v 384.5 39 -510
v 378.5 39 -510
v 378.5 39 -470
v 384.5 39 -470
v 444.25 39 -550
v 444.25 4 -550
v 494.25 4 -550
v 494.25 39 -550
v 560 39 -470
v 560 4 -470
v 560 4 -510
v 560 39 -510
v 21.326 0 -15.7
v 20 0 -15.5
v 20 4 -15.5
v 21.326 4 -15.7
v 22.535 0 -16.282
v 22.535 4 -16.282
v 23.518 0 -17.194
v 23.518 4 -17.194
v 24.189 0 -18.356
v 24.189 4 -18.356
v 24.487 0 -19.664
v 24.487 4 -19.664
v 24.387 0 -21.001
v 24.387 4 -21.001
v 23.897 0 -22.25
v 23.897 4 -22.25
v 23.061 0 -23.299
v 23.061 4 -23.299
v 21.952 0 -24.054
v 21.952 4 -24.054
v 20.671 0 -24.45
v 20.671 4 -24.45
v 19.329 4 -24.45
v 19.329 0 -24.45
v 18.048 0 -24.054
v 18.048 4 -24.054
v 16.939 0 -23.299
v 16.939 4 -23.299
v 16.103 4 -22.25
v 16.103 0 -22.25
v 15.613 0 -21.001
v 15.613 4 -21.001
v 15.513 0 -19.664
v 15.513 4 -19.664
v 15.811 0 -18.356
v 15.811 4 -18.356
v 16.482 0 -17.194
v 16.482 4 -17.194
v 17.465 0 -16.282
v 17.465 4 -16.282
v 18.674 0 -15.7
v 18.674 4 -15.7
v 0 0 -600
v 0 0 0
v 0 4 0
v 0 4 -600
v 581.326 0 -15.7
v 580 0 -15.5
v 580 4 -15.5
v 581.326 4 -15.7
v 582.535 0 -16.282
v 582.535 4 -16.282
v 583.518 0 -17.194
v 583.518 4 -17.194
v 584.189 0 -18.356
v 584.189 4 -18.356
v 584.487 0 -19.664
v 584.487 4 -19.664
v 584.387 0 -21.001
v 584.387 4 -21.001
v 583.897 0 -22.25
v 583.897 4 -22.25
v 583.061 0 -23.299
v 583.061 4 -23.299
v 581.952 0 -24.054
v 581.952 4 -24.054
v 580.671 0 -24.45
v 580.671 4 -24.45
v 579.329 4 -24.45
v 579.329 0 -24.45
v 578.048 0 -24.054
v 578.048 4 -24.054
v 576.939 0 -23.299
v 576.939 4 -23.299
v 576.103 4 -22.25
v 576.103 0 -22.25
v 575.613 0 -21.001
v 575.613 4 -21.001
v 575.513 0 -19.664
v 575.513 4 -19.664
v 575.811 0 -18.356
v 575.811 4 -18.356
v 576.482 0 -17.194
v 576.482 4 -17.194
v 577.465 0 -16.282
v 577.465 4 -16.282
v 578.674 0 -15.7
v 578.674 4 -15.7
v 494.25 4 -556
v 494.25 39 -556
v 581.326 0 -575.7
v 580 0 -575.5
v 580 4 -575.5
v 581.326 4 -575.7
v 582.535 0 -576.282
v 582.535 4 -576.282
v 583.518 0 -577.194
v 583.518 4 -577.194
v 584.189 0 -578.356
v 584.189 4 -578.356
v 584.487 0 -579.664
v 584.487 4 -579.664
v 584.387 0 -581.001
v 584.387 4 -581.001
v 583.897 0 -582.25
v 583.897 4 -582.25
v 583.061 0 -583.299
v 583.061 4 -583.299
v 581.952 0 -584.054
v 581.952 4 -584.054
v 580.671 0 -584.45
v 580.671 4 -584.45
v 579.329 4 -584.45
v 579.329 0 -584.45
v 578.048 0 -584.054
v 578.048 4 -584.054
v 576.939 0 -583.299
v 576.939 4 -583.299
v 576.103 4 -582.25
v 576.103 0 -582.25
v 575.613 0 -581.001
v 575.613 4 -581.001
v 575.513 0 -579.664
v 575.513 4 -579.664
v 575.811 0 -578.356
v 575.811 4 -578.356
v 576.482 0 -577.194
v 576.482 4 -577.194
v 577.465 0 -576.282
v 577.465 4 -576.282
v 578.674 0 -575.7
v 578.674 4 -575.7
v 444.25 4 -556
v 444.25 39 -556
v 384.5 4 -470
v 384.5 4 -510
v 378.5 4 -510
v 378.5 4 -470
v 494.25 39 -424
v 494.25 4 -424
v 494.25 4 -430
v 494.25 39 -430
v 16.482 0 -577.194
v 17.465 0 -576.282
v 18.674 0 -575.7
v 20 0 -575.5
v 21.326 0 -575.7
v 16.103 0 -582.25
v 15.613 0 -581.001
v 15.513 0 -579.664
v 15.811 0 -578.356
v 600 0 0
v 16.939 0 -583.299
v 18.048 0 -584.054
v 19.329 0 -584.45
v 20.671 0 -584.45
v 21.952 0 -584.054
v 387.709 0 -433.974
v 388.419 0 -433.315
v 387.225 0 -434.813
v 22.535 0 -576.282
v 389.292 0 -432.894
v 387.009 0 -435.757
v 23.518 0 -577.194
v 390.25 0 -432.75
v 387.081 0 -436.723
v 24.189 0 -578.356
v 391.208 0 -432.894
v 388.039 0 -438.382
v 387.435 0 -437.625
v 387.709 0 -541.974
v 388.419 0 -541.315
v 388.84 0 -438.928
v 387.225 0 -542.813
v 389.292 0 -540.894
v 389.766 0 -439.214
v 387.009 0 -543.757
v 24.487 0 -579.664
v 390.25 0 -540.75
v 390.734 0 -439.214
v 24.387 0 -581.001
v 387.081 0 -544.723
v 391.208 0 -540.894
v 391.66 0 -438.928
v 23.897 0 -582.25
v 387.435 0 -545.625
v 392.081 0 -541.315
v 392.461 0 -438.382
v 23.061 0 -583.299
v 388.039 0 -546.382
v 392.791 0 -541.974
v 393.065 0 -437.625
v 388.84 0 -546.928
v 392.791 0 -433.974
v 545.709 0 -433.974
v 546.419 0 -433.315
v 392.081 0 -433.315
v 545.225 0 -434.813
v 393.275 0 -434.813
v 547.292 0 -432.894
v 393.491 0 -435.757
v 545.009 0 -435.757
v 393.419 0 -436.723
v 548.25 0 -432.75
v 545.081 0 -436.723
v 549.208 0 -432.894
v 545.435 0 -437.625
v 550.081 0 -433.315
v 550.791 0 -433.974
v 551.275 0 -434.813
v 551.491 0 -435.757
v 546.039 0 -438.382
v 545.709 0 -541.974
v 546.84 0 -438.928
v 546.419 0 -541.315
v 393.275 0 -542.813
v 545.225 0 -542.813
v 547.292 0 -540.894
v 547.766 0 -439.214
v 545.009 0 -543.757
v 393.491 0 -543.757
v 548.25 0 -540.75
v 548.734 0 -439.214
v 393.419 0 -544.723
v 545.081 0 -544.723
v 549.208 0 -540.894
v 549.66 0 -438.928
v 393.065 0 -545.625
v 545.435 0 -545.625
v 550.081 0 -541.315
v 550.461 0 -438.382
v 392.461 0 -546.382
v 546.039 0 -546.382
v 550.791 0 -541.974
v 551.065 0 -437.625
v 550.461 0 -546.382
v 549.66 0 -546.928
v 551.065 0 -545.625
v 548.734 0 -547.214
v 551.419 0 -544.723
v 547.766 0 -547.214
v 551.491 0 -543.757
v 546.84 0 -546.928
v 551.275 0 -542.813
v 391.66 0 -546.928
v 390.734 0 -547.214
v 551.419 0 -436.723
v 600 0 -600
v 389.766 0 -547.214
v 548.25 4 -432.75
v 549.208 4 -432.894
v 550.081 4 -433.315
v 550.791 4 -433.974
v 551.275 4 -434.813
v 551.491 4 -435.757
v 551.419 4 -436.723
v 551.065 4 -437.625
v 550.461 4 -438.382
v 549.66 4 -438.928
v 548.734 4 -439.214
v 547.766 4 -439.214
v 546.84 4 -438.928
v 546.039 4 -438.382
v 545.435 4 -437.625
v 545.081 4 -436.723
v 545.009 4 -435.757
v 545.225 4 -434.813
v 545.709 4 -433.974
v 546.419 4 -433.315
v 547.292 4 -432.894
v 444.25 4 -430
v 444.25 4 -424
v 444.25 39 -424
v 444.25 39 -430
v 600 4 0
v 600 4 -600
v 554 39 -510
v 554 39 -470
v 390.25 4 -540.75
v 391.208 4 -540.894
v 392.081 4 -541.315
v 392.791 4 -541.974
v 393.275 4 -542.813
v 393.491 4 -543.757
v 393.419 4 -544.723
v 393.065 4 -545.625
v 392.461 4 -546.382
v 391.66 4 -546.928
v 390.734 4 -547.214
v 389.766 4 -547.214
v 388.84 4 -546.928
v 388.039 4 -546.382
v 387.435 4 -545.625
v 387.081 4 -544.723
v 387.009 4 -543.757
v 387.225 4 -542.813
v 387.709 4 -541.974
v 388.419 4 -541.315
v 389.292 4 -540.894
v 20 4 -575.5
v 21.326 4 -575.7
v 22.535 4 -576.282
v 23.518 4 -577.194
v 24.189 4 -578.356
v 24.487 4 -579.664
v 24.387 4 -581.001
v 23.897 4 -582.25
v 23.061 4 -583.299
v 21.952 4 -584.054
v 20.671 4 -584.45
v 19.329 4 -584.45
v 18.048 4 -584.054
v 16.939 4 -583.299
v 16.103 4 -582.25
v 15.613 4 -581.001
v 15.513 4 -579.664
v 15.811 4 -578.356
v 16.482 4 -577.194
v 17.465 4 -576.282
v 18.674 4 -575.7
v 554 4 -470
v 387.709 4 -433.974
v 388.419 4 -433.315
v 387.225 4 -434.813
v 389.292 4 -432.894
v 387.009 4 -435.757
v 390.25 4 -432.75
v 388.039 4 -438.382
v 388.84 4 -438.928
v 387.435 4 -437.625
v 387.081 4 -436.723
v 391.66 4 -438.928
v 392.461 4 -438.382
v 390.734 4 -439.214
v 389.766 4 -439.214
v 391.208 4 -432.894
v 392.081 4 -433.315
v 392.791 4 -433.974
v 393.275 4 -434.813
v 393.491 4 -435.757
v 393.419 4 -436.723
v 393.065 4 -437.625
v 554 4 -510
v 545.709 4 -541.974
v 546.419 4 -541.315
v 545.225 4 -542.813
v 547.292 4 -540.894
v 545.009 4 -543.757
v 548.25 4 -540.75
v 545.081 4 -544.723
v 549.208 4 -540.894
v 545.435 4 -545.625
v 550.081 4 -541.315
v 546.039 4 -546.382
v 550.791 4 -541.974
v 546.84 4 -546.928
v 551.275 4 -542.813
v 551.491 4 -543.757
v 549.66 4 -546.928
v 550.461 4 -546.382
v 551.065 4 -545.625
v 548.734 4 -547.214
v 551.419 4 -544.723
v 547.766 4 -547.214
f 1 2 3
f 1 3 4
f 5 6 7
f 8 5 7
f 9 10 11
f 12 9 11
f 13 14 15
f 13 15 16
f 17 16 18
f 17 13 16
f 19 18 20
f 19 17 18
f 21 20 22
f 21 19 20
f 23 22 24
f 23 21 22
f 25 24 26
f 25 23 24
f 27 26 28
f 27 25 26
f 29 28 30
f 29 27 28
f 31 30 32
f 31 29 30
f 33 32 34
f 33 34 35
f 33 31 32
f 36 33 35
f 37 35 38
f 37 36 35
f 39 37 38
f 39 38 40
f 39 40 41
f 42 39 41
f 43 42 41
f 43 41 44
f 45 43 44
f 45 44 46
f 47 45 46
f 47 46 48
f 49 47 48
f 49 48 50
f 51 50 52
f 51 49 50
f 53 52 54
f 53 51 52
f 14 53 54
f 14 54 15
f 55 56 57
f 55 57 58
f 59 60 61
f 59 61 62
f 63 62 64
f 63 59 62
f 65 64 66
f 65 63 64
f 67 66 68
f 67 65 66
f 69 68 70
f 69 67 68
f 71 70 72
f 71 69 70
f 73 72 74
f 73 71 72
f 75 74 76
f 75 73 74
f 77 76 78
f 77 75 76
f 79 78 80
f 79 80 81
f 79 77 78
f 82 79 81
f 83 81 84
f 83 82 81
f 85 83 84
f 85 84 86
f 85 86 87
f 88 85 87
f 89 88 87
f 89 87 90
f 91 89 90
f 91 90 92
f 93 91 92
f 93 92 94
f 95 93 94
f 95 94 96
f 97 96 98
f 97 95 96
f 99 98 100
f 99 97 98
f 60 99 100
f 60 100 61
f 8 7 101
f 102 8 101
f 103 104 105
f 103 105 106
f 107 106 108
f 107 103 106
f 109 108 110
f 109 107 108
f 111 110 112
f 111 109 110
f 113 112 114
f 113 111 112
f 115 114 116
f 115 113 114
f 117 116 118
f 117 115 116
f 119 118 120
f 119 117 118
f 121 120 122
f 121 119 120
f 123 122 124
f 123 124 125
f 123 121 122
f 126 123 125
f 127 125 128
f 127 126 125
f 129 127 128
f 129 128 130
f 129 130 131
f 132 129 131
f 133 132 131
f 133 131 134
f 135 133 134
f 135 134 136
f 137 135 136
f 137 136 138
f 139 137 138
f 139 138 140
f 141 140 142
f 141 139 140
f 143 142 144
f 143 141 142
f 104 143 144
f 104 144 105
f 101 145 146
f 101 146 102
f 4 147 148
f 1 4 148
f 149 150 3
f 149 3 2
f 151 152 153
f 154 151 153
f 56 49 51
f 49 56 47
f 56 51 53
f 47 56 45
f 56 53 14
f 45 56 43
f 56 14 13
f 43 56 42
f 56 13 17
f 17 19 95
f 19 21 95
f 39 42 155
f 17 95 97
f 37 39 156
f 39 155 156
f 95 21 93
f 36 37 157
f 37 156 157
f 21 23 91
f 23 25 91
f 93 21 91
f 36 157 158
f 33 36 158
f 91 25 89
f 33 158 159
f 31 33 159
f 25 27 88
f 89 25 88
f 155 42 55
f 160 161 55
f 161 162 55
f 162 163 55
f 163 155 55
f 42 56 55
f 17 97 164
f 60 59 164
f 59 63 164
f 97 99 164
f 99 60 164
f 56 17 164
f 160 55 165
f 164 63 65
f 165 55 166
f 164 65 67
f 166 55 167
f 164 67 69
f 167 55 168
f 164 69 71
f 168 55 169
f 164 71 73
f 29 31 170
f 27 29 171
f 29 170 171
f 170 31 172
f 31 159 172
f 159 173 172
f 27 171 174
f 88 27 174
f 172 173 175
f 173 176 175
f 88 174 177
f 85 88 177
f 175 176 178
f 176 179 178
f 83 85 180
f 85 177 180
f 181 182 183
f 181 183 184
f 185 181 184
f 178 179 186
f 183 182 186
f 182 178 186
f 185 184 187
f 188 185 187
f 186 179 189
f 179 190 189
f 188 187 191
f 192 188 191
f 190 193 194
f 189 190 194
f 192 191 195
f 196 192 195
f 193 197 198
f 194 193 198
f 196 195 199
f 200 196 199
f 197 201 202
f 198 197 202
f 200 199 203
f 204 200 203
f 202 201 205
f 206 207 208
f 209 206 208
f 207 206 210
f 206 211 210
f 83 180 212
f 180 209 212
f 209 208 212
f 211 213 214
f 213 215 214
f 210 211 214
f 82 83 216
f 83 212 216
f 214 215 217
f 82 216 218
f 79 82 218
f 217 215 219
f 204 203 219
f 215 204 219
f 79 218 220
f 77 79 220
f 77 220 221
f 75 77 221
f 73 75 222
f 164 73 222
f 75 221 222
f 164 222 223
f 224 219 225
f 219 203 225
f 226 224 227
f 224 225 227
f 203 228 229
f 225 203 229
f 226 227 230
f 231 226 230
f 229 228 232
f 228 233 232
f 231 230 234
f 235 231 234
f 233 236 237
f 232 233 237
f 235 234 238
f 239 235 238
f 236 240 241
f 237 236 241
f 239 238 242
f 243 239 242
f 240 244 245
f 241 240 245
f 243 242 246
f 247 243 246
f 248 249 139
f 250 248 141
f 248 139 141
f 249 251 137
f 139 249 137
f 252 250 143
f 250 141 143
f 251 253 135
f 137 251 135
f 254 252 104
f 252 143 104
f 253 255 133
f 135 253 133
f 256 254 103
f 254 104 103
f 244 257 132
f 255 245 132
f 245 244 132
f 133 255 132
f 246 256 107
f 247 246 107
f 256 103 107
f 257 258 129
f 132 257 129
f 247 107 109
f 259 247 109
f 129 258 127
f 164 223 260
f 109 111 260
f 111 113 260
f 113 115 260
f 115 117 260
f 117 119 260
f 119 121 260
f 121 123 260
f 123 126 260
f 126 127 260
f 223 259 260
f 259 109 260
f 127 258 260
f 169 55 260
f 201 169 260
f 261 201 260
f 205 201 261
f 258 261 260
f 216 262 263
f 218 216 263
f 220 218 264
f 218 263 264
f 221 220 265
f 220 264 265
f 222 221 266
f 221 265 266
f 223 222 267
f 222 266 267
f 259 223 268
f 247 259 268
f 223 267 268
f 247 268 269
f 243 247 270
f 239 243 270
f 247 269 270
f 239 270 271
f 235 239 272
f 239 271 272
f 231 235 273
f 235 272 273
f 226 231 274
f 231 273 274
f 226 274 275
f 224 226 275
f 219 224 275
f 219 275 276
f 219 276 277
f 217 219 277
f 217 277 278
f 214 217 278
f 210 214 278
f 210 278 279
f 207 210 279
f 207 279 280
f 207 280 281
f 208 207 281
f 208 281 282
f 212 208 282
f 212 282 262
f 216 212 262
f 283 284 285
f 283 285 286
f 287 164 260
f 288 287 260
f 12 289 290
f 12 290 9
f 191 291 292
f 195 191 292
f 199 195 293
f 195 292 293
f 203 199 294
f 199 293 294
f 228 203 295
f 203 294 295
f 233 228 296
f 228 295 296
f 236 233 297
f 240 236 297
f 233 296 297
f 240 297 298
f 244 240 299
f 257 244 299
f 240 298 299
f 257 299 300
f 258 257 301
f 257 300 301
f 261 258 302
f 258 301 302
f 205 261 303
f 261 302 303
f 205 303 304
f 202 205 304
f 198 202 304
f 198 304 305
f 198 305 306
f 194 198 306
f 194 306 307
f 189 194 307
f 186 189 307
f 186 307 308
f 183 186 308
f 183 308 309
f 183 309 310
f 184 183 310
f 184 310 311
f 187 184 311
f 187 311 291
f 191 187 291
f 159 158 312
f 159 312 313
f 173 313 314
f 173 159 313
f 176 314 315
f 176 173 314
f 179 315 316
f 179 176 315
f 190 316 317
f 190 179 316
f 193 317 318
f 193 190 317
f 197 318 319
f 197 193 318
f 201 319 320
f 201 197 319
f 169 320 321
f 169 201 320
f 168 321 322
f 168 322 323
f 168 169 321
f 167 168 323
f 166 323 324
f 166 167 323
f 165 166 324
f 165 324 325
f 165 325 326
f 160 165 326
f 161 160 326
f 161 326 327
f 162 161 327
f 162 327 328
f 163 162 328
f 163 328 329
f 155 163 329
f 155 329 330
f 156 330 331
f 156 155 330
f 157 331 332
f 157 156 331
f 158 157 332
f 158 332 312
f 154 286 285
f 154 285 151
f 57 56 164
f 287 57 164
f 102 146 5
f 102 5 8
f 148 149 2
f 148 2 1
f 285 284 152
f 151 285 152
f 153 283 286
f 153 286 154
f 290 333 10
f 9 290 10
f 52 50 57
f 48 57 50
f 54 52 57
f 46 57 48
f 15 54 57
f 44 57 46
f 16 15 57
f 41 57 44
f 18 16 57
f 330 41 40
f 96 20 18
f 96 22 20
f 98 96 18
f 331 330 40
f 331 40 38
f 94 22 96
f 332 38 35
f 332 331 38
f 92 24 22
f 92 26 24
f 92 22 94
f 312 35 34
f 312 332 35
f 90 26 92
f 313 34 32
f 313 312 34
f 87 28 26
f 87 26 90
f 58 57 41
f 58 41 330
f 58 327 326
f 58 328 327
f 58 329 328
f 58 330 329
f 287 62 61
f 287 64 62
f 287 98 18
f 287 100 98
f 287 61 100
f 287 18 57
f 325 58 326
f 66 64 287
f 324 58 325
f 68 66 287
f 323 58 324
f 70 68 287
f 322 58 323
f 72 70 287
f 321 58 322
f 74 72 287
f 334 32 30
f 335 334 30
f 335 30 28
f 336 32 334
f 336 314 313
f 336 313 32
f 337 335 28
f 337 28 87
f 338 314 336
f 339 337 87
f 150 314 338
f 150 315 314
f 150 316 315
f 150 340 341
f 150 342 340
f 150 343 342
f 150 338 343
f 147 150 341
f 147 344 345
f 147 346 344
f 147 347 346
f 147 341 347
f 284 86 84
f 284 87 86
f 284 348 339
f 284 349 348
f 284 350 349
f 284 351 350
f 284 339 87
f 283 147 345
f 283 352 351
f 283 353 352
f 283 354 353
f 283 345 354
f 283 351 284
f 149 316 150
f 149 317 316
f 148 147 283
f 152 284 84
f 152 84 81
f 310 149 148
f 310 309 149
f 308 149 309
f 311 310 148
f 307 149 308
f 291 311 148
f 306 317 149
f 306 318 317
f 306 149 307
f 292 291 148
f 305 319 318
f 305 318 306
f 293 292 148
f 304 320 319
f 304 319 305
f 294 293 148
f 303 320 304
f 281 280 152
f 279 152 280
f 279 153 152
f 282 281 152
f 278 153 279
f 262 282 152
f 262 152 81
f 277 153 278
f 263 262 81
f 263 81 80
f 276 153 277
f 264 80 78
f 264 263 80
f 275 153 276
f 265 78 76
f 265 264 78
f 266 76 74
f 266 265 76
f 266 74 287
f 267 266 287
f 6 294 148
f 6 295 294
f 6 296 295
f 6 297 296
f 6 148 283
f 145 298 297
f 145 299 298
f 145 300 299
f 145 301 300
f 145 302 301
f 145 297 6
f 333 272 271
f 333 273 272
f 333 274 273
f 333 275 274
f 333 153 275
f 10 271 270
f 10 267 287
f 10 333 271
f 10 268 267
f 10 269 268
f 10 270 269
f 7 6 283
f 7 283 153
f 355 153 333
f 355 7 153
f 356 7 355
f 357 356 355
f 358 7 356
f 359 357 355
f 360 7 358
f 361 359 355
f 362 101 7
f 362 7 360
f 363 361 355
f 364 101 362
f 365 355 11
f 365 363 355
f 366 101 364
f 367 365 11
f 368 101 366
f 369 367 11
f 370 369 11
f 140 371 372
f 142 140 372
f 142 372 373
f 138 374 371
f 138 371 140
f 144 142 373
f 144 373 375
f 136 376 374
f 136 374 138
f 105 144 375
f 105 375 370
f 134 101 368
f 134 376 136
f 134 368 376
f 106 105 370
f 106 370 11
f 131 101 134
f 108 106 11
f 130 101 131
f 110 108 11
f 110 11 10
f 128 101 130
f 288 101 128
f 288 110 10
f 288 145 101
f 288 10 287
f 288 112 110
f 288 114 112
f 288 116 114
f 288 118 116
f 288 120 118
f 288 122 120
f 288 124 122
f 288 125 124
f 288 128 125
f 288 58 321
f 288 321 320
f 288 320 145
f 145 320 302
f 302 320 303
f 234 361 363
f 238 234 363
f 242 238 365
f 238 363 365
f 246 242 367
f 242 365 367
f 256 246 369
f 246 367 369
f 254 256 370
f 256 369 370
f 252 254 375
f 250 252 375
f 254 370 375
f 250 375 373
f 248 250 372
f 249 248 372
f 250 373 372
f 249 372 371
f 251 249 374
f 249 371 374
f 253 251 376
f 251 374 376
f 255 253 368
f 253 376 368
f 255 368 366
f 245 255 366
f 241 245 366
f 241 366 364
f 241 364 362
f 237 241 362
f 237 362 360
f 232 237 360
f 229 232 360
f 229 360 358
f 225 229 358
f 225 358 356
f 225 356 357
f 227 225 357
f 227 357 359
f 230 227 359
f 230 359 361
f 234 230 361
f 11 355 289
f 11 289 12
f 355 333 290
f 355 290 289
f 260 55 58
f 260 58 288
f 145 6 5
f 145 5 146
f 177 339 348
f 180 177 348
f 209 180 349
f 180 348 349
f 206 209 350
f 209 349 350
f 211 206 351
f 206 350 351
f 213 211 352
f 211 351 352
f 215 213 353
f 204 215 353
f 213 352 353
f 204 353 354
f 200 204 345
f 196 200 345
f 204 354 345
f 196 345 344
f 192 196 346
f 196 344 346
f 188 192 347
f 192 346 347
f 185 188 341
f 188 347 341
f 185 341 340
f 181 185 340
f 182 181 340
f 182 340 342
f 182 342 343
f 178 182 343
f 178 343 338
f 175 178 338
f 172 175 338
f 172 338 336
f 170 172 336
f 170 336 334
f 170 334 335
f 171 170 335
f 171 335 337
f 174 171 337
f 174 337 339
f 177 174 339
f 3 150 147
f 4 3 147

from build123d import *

# Parameters (mm, degrees)
SKETCH1_W           = 600
SKETCH1_H           = 600
SKETCH1_R           = 4.5
BOSS_EXTRUDE1_DEPTH = 4
CUT_EXTRUDE2_REACH  = 850.538
SKETCH4_R           = 3.25
SKETCH4_3_W         = 6
SKETCH4_3_H         = 40
SKETCH4_3_W_2       = 50
SKETCH4_3_H_2       = 6
BOSS_EXTRUDE2_DEPTH = 35


with BuildPart() as part:
    # Sketch1 → Boss-Extrude1 (new body)
    with BuildSketch(Plane(origin=(0, 0, 0), x_dir=(1, 0, 0), z_dir=(0, 1, 0))):
        with Locations((300, 300)):
            Rectangle(SKETCH1_W, SKETCH1_H)
        with Locations((20, 580)):
            Circle(SKETCH1_R, mode=Mode.SUBTRACT)
        with Locations((580, 580)):
            Circle(SKETCH1_R, mode=Mode.SUBTRACT)
        with Locations((580, 20)):
            Circle(SKETCH1_R, mode=Mode.SUBTRACT)
        with Locations((20, 20)):
            Circle(SKETCH1_R, mode=Mode.SUBTRACT)
    extrude(amount=BOSS_EXTRUDE1_DEPTH)

    # Sketch4 → Cut-Extrude2 (cut, up to next)
    with BuildSketch(Plane(origin=(0, 4, 0), x_dir=(1, 0, 0), z_dir=(0, 1, 0)), mode=Mode.PRIVATE) as cut_extrude2_sk1:
        with Locations((390.25, 544)):
            Circle(SKETCH4_R)
    cut_extrude2_tool1 = extrude(cut_extrude2_sk1.sketch, amount=-CUT_EXTRUDE2_REACH, mode=Mode.PRIVATE) & part.part
    # Sketch4 → Cut-Extrude2 (cut, up to next)
    with BuildSketch(Plane(origin=(0, 4, 0), x_dir=(1, 0, 0), z_dir=(0, 1, 0)), mode=Mode.PRIVATE) as cut_extrude2_sk2:
        with Locations((548.25, 544)):
            Circle(SKETCH4_R)
    cut_extrude2_tool2 = extrude(cut_extrude2_sk2.sketch, amount=-CUT_EXTRUDE2_REACH, mode=Mode.PRIVATE) & part.part
    # Sketch4 → Cut-Extrude2 (cut, up to next)
    with BuildSketch(Plane(origin=(0, 4, 0), x_dir=(1, 0, 0), z_dir=(0, 1, 0)), mode=Mode.PRIVATE) as cut_extrude2_sk3:
        with Locations((390.25, 436)):
            Circle(SKETCH4_R)
    cut_extrude2_tool3 = extrude(cut_extrude2_sk3.sketch, amount=-CUT_EXTRUDE2_REACH, mode=Mode.PRIVATE) & part.part
    # Sketch4 → Cut-Extrude2 (cut, up to next)
    with BuildSketch(Plane(origin=(0, 4, 0), x_dir=(1, 0, 0), z_dir=(0, 1, 0)), mode=Mode.PRIVATE) as cut_extrude2_sk4:
        with Locations((548.25, 436)):
            Circle(SKETCH4_R)
    cut_extrude2_tool4 = extrude(cut_extrude2_sk4.sketch, amount=-CUT_EXTRUDE2_REACH, mode=Mode.PRIVATE) & part.part
    add(cut_extrude2_tool1.solids().sort_by_distance((390.25, 4, -544))[0], mode=Mode.SUBTRACT)
    add(cut_extrude2_tool2.solids().sort_by_distance((548.25, 4, -544))[0], mode=Mode.SUBTRACT)
    add(cut_extrude2_tool3.solids().sort_by_distance((390.25, 4, -436))[0], mode=Mode.SUBTRACT)
    add(cut_extrude2_tool4.solids().sort_by_distance((548.25, 4, -436))[0], mode=Mode.SUBTRACT)

    # Sketch4<3> → Boss-Extrude2 (add)
    with BuildSketch(Plane(origin=(0, 4, 0), x_dir=(1, 0, 0), z_dir=(0, 1, 0))):
        with Locations((381.5, 490)):
            Rectangle(SKETCH4_3_W, SKETCH4_3_H)
        with Locations((469.25, 553)):
            Rectangle(SKETCH4_3_W_2, SKETCH4_3_H_2)
        with Locations((557, 490)):
            Rectangle(SKETCH4_3_W, SKETCH4_3_H)
        with Locations((469.25, 427)):
            Rectangle(SKETCH4_3_W_2, SKETCH4_3_H_2)
    extrude(amount=BOSS_EXTRUDE2_DEPTH)


solid = part.part
